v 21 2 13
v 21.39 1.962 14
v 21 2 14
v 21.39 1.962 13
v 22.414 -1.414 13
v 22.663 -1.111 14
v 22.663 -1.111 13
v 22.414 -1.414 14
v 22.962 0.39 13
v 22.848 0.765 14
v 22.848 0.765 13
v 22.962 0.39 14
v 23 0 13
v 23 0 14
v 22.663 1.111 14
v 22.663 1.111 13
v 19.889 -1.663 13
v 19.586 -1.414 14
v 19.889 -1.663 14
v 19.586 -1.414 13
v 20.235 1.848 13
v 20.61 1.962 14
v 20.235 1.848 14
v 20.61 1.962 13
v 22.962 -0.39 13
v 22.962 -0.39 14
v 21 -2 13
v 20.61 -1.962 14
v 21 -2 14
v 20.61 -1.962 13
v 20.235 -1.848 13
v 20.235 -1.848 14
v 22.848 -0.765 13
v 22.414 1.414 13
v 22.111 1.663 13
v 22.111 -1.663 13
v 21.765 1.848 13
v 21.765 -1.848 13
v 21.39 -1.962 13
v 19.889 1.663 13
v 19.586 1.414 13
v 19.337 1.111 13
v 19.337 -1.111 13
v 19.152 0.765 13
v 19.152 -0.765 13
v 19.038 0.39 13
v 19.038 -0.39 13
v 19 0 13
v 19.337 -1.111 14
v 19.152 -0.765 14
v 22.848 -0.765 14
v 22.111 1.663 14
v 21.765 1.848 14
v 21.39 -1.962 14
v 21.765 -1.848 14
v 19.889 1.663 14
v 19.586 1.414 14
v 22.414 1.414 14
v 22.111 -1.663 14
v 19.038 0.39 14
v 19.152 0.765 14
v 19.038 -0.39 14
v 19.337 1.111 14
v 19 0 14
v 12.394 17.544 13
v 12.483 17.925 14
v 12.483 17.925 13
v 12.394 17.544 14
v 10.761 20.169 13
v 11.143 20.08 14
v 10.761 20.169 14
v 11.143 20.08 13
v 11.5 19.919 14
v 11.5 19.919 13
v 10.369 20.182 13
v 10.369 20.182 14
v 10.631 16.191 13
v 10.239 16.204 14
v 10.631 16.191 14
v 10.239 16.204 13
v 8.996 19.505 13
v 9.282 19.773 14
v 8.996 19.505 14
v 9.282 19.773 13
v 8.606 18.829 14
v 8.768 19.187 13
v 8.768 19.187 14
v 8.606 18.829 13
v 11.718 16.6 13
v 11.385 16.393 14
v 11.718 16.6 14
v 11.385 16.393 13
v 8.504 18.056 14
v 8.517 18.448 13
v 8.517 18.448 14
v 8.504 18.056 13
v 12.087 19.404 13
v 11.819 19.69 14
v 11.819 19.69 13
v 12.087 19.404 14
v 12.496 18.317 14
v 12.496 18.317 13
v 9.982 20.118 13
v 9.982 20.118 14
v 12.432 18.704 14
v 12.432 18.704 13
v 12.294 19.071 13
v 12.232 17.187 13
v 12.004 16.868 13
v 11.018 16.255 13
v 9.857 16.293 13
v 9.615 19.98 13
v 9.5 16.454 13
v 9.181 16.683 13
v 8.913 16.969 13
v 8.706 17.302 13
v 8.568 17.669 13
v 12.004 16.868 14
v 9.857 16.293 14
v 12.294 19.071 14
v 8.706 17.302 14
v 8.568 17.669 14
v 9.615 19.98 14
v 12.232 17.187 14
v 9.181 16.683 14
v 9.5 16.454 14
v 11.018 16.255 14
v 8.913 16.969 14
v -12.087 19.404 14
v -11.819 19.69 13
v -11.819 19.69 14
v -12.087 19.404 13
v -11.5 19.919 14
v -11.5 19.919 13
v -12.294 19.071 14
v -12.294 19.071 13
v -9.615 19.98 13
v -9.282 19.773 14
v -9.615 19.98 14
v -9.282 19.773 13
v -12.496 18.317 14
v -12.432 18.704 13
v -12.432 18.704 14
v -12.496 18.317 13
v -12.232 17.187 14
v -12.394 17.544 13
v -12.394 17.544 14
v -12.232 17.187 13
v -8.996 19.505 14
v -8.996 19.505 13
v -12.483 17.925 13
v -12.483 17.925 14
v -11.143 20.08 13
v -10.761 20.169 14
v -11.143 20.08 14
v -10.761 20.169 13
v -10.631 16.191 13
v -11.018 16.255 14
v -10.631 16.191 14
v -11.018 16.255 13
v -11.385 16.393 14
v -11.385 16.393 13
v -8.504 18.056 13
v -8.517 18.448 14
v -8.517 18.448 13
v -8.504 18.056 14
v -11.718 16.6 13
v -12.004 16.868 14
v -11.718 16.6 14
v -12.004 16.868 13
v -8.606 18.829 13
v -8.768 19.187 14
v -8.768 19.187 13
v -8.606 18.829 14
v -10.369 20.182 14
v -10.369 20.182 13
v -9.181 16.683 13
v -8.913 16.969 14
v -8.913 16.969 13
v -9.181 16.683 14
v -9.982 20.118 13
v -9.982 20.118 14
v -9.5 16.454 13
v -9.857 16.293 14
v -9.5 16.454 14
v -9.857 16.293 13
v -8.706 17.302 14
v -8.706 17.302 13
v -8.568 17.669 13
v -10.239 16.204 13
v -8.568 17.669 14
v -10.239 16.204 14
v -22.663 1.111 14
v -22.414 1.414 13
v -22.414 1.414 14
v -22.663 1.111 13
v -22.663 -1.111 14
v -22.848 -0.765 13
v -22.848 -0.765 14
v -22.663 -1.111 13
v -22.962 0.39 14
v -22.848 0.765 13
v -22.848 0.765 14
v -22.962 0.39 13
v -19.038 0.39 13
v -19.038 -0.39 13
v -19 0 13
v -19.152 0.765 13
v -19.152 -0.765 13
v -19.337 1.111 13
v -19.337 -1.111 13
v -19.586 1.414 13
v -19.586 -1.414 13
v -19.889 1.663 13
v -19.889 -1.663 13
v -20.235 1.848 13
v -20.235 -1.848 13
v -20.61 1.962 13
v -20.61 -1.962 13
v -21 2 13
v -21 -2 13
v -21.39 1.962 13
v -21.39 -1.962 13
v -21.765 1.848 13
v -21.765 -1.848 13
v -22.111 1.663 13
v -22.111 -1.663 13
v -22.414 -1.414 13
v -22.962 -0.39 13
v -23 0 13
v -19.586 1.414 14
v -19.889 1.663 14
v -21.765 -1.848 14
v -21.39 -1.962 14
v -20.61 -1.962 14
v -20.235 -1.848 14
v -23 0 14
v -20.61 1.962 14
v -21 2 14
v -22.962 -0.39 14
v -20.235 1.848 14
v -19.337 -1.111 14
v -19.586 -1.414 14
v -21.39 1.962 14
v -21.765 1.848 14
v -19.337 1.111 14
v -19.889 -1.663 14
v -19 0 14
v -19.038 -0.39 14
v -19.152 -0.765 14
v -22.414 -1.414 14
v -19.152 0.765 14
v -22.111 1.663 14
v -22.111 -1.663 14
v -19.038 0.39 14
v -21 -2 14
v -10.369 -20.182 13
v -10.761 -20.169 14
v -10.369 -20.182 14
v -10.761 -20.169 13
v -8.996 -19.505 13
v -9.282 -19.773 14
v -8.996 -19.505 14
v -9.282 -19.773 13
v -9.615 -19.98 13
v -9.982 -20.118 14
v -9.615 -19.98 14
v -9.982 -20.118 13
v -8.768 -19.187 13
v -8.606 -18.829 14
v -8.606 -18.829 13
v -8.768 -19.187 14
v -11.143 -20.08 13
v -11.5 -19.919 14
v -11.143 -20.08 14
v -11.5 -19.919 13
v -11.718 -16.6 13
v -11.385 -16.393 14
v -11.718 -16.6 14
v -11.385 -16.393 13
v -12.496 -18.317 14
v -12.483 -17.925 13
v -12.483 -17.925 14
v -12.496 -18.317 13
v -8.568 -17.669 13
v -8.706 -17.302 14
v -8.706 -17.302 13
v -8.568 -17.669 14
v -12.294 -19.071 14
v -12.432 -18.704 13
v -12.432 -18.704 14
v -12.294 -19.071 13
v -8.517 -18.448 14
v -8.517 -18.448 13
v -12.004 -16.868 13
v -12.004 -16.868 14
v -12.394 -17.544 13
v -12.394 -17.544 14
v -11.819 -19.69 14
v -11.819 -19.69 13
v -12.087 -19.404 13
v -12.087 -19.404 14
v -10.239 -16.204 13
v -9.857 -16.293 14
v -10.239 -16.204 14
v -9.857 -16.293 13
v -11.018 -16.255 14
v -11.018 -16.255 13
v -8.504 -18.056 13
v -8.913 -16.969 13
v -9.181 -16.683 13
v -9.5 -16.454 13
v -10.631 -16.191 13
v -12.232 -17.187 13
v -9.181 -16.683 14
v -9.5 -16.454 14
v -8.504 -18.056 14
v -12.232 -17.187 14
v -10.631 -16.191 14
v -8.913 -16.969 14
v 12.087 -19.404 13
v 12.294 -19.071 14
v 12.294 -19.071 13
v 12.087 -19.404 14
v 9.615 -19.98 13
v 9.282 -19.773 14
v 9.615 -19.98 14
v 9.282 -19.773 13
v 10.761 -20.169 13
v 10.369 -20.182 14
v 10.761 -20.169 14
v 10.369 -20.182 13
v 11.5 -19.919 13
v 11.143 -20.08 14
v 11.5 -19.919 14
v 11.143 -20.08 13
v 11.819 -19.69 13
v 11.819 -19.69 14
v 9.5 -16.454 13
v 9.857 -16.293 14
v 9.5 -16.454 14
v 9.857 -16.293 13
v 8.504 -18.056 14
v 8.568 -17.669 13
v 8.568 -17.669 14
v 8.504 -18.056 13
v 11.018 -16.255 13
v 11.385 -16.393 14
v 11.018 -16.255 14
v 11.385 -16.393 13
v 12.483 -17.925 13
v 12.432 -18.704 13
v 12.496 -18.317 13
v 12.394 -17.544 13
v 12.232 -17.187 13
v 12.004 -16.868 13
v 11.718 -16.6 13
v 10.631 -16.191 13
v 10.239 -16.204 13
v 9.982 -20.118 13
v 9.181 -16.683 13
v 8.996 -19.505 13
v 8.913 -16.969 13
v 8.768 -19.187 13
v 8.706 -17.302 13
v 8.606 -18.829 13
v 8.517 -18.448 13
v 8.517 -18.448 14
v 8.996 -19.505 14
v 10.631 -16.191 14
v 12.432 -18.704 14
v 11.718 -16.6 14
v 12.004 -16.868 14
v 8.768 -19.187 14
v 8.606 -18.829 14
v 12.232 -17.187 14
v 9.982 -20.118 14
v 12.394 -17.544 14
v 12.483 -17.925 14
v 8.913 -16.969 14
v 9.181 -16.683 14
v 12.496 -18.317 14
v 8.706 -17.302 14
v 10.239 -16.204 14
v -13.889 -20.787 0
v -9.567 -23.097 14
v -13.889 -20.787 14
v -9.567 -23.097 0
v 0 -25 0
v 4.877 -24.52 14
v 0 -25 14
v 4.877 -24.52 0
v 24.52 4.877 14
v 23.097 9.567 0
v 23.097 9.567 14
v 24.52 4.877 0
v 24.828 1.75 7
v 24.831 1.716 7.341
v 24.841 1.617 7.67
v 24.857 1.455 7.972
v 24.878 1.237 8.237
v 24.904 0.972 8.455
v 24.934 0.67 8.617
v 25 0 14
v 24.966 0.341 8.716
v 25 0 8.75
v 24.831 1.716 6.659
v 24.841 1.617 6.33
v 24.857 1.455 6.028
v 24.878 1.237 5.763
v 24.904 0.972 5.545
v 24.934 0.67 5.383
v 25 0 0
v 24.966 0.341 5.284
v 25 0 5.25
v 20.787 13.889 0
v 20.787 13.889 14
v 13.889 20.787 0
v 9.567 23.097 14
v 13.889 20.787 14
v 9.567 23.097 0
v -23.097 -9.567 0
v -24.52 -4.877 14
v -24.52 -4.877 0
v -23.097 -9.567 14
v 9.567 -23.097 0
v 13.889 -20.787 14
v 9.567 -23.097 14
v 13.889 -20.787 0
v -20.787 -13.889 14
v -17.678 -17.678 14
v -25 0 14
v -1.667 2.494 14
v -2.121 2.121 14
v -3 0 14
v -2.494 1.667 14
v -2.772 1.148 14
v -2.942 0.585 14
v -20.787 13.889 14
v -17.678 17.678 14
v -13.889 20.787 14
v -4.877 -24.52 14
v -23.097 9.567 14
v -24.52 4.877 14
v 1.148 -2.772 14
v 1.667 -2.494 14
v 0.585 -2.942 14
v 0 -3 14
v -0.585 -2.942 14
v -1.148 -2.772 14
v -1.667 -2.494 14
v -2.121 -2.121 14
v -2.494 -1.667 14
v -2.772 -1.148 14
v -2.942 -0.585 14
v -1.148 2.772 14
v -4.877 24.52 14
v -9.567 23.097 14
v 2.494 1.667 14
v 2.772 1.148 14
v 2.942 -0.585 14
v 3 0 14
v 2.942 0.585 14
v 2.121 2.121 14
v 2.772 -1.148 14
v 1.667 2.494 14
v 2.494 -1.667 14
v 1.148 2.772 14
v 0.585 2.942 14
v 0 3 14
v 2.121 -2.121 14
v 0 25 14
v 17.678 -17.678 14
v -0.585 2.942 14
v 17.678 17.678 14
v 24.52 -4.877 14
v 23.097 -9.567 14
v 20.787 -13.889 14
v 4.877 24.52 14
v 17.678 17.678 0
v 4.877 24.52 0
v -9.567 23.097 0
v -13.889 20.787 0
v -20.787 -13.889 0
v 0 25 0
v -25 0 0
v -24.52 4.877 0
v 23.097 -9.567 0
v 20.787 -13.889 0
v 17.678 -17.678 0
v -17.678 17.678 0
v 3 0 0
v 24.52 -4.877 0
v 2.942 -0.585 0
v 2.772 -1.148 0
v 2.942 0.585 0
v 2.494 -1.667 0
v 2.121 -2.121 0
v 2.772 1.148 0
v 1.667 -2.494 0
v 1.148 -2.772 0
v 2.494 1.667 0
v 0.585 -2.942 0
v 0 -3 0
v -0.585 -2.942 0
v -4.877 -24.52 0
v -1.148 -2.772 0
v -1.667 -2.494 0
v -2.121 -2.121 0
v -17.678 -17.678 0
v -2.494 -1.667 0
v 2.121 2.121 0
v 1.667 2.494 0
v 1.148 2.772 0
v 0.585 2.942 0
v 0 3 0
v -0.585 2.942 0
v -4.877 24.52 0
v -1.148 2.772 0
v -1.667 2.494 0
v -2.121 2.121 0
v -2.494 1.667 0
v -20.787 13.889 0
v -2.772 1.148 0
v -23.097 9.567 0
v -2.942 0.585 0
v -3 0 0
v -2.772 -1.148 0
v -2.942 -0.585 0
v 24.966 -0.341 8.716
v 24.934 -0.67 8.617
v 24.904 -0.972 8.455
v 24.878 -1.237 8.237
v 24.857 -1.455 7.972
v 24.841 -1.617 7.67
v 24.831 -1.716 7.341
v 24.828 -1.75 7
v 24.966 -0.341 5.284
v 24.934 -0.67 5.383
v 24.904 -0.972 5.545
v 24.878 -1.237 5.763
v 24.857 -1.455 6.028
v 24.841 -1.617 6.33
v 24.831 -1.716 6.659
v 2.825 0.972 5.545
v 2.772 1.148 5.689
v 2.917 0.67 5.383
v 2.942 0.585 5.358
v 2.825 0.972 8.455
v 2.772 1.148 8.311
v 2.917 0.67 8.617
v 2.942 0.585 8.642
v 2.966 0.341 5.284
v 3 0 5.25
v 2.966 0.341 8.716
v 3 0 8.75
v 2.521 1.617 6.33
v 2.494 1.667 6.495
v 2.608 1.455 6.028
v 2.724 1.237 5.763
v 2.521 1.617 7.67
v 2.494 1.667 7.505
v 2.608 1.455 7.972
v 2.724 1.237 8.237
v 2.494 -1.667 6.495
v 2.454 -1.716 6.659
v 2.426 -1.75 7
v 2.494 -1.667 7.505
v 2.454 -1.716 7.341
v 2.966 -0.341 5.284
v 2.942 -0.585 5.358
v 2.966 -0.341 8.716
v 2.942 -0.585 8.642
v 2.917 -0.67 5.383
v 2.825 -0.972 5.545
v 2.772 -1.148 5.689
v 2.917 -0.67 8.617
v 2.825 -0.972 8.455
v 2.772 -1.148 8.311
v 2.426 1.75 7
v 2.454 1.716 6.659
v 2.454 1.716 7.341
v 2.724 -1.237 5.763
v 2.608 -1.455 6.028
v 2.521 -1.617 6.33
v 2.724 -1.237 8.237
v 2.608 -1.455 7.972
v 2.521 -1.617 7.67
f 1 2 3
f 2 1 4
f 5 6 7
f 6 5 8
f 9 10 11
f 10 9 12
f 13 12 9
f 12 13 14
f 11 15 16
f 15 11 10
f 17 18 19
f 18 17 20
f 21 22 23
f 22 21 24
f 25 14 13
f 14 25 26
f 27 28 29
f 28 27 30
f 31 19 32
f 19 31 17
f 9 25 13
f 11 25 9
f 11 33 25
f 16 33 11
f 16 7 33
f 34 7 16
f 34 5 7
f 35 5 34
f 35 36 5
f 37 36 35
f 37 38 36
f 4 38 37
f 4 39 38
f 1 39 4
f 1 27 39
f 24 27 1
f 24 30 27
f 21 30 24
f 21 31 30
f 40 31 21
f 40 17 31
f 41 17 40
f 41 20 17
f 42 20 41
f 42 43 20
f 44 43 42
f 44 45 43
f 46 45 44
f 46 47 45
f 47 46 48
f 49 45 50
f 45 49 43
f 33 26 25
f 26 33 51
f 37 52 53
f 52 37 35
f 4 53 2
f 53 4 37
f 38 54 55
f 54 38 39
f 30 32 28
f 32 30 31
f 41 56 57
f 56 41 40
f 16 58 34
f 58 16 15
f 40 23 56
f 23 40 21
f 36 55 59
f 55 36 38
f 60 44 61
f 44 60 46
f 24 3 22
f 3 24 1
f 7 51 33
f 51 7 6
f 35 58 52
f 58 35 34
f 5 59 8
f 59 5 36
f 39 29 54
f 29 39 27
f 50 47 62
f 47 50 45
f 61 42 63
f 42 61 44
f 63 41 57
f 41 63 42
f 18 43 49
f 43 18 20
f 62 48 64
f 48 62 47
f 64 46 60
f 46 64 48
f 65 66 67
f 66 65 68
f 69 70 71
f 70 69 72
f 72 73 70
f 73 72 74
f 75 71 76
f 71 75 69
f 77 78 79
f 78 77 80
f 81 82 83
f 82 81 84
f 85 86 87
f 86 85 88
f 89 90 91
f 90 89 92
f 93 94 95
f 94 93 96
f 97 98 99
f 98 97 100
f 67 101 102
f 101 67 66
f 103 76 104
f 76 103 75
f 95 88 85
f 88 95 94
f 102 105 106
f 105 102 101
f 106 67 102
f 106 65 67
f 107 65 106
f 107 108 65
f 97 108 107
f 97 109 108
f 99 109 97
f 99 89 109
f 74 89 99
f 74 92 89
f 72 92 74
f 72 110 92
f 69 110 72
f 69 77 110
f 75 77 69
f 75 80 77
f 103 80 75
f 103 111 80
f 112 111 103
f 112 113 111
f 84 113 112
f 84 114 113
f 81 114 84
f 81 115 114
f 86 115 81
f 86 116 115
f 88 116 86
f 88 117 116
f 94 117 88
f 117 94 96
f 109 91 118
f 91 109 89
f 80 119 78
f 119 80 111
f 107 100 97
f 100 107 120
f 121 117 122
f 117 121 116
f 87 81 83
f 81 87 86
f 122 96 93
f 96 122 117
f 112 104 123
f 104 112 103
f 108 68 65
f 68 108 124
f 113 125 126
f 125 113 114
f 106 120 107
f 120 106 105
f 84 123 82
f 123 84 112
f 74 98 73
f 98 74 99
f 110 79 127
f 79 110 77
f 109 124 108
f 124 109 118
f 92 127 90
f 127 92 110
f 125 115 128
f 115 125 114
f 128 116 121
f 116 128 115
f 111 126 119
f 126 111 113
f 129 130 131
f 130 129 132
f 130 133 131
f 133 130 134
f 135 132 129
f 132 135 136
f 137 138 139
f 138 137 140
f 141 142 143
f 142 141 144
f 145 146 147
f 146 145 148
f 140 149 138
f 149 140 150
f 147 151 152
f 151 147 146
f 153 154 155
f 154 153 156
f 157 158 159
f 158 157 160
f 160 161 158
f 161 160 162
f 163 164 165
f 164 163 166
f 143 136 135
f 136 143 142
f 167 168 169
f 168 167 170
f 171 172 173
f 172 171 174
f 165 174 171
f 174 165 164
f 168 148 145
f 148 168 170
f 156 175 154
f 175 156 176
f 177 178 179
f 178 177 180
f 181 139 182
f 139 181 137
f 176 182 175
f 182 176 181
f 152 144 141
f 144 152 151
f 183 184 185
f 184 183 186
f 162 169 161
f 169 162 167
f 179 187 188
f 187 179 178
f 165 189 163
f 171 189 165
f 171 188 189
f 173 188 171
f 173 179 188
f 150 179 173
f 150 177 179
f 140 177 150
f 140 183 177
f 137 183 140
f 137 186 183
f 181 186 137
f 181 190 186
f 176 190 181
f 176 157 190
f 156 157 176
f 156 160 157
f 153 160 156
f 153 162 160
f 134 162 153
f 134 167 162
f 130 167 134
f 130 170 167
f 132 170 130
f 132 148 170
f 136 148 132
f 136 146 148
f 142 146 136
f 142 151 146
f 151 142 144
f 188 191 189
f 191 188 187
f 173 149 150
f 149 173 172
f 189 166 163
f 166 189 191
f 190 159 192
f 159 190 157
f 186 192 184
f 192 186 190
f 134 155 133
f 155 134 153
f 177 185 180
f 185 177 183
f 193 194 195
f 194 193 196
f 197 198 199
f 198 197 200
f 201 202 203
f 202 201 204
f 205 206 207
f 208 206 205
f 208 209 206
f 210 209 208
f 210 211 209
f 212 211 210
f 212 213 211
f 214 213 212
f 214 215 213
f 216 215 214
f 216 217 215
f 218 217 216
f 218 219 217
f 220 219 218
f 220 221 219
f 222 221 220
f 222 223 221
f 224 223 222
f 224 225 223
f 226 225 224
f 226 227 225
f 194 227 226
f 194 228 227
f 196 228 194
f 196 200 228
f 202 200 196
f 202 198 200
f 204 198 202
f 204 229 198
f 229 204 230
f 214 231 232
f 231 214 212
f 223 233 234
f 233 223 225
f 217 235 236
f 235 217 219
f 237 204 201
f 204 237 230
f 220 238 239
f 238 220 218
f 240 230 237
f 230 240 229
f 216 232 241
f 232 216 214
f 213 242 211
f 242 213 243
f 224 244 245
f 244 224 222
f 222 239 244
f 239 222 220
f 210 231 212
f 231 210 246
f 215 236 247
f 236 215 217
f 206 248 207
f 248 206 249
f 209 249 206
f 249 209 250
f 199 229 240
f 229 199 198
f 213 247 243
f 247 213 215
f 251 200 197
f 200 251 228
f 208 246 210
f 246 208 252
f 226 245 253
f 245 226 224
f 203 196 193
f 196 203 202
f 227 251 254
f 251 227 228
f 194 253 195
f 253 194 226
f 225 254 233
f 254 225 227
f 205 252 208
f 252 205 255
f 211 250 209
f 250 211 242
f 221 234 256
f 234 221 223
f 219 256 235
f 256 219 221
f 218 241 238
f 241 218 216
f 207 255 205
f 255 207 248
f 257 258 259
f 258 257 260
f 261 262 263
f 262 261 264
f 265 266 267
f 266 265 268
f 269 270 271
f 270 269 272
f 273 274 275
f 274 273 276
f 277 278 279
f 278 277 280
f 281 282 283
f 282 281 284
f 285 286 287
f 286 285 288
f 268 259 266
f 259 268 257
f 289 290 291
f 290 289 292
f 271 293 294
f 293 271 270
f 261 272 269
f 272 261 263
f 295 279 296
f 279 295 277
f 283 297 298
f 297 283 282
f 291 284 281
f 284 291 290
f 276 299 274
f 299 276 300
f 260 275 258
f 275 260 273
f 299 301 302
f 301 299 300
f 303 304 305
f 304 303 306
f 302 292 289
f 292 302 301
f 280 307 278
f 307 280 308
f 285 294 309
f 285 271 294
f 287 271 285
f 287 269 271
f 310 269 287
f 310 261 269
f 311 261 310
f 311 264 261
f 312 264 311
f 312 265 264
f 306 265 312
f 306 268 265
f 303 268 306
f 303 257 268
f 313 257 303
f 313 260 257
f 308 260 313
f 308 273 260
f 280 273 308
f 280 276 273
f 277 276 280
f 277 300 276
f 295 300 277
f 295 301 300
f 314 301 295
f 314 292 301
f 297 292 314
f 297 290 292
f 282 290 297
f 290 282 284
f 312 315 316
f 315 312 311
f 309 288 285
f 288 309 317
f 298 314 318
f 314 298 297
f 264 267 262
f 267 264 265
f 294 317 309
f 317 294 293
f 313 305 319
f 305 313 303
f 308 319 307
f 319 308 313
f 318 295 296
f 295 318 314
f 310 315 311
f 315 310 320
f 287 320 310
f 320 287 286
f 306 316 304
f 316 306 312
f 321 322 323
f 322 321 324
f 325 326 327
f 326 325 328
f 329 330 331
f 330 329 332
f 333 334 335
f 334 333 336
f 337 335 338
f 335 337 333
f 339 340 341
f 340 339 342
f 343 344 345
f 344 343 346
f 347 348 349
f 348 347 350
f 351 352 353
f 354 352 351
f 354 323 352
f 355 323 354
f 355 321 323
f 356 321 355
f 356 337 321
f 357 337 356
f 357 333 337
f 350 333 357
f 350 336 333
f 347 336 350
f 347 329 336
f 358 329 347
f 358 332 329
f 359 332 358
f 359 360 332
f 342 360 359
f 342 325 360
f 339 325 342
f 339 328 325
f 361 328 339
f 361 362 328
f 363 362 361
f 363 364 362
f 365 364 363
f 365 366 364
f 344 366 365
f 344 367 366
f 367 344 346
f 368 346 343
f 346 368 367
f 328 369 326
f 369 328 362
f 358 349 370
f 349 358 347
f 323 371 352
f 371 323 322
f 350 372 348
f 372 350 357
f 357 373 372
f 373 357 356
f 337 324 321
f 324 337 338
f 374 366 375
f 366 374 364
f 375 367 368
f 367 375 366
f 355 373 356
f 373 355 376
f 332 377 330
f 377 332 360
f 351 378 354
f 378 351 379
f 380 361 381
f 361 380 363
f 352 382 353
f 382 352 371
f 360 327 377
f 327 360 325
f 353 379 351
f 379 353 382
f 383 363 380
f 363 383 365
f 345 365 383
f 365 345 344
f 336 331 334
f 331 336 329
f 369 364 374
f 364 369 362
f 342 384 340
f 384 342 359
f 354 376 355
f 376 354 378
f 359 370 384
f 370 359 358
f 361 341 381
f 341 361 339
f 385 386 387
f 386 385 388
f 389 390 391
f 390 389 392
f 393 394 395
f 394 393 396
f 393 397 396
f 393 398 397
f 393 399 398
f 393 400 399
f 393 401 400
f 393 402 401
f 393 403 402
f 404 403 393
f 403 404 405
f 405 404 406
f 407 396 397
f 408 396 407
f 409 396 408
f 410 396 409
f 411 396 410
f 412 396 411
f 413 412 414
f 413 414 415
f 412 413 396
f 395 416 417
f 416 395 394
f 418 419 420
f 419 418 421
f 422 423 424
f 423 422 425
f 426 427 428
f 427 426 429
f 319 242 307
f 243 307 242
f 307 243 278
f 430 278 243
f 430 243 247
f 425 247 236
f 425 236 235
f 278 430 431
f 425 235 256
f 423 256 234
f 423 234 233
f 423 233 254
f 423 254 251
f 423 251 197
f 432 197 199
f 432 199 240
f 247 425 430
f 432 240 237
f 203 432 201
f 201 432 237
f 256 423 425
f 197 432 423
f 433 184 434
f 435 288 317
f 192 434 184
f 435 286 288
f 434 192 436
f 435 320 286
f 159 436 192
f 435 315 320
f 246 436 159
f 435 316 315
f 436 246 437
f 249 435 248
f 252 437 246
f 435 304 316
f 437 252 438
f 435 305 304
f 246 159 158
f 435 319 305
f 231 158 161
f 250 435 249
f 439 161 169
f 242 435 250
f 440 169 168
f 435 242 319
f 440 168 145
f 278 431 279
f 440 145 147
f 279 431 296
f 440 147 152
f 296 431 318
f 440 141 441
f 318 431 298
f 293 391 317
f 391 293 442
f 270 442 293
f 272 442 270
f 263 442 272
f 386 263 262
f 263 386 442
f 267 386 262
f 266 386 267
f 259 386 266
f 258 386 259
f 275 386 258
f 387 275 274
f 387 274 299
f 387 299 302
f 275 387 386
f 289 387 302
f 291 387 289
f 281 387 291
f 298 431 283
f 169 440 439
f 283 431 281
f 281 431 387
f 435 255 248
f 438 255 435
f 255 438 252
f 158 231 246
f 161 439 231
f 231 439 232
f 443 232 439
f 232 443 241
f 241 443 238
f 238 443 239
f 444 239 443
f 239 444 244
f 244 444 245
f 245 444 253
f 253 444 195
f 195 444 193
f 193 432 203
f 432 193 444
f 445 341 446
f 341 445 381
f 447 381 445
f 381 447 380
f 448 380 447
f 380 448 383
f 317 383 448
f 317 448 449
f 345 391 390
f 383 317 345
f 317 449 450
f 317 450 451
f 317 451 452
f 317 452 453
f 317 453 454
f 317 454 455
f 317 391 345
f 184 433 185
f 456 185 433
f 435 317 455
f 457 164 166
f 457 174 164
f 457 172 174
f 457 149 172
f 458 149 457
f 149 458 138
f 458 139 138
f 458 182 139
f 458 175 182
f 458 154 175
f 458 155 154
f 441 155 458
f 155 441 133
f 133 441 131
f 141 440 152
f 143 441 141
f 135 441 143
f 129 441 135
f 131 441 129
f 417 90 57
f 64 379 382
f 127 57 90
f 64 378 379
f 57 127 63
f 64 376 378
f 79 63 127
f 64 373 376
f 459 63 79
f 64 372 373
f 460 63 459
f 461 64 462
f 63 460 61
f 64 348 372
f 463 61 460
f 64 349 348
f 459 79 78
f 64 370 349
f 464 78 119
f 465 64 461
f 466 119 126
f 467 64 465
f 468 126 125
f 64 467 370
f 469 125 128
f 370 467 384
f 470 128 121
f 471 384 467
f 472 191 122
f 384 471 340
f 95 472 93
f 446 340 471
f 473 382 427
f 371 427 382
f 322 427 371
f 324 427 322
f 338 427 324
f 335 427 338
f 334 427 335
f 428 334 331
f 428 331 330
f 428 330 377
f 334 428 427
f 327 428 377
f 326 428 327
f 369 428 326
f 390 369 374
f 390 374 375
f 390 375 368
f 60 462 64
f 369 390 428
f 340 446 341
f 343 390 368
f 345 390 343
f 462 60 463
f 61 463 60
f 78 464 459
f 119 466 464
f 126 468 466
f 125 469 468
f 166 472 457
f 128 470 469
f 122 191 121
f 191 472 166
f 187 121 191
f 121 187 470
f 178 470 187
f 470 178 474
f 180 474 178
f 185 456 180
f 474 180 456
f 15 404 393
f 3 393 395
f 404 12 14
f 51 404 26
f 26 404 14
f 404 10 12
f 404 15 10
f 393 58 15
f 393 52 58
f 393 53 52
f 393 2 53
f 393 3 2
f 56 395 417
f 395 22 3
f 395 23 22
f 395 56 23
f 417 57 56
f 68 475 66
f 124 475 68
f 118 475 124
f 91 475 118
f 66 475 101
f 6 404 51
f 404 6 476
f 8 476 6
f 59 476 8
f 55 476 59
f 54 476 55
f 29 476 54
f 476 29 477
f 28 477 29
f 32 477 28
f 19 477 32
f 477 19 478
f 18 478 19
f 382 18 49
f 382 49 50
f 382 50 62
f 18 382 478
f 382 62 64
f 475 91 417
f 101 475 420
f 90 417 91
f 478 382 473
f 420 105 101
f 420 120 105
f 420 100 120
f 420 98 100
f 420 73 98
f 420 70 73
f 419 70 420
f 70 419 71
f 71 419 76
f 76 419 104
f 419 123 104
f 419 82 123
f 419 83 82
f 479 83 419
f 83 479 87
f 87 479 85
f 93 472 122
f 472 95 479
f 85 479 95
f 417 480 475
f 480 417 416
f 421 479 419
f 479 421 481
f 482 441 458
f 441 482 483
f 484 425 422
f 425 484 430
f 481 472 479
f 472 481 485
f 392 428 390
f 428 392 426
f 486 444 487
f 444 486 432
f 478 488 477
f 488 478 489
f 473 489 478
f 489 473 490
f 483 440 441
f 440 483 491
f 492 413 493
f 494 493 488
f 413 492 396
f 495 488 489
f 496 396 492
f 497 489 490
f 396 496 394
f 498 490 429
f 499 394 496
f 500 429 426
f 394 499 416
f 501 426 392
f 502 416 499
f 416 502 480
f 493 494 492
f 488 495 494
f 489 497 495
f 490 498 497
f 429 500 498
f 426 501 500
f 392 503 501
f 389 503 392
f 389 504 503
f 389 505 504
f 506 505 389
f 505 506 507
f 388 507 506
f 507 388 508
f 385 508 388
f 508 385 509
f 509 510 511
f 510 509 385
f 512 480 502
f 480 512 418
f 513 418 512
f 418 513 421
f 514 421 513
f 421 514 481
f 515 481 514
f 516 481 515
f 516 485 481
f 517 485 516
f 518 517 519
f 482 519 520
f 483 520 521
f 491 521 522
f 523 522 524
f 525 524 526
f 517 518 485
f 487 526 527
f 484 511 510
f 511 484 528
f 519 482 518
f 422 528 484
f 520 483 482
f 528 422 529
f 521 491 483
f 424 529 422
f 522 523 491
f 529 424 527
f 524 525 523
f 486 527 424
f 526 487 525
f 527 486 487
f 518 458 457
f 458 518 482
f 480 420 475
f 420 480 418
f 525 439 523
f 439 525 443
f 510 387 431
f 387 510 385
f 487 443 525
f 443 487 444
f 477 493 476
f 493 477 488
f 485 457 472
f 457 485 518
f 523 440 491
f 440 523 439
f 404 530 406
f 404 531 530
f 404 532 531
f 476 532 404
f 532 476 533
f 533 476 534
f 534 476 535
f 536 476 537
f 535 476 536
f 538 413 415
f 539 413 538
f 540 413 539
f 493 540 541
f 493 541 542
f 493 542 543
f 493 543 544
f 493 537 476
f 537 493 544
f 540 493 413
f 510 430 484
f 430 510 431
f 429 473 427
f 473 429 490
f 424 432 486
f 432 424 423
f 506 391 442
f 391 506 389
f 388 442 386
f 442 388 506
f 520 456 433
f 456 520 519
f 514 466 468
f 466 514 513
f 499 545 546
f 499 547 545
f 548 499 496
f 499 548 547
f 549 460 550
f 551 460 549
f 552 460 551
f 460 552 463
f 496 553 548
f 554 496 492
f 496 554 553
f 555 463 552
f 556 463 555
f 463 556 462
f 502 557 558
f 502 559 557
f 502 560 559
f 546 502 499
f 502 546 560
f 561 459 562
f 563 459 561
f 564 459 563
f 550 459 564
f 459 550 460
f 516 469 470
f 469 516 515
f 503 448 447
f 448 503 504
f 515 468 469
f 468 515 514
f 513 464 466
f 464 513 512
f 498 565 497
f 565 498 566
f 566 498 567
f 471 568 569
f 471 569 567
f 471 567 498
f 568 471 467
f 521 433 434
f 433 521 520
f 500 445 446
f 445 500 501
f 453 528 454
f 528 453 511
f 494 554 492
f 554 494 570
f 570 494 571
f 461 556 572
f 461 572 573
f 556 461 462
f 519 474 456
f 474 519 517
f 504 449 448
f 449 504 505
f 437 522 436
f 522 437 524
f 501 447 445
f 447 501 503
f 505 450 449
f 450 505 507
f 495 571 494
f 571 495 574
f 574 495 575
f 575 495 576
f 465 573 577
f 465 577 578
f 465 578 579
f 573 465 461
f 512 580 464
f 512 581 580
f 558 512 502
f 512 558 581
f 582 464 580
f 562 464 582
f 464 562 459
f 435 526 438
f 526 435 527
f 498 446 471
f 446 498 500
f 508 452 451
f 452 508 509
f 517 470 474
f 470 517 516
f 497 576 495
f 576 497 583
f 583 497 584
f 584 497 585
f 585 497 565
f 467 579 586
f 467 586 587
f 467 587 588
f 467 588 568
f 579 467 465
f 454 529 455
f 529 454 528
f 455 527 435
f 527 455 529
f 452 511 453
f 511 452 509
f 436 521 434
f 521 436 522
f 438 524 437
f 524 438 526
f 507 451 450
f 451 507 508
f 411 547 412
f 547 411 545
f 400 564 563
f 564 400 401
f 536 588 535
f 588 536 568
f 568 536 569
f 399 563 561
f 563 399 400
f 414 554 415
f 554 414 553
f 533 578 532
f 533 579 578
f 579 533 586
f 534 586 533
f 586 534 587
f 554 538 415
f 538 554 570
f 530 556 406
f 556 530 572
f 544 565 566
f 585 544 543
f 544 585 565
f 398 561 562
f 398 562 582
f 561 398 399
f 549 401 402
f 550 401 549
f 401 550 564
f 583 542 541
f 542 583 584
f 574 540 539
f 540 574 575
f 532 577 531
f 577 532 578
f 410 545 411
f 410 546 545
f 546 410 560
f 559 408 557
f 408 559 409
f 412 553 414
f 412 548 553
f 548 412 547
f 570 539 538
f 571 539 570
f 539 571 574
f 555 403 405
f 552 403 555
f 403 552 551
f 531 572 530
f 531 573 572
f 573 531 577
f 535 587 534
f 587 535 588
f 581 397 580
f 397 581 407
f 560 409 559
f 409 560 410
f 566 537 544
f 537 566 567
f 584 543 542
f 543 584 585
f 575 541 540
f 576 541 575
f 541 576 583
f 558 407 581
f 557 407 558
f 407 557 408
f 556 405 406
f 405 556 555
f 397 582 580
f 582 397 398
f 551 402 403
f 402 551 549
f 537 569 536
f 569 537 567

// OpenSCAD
$fn = 32;

// ----------------------------------------------------------------------
// Control knob: dimpled knob
// ----------------------------------------------------------------------

// --- parameters (mm) ---
dimp_d = 4;               // finger dimple diameter
n_dimp = 6;               // number of dimples
dimp_r = 21;              // dimple ring radius
knob_d = 50;              // knob body diameter
knob_h = 14;              // knob body height
bore_d = 6;               // shaft bore diameter
set_d = 3.5;              // set screw bore diameter

dimp_step = 360 / n_dimp;  // dimple angular step

difference() {
  cylinder(h = knob_h, d = knob_d);
  translate([0, 0, -1]) cylinder(h = knob_h + 2, d = bore_d);
  translate([-1, 0, knob_h / 2]) rotate([0, 90, 0])
    cylinder(h = knob_d / 2 + bore_d / 2 + 2, d = set_d);  for (i = [0 : n_dimp - 1])
    rotate([0, 0, i * dimp_step])
      translate([dimp_r, 0, knob_h - 1])
        cylinder(h = 2, d = dimp_d);
}
